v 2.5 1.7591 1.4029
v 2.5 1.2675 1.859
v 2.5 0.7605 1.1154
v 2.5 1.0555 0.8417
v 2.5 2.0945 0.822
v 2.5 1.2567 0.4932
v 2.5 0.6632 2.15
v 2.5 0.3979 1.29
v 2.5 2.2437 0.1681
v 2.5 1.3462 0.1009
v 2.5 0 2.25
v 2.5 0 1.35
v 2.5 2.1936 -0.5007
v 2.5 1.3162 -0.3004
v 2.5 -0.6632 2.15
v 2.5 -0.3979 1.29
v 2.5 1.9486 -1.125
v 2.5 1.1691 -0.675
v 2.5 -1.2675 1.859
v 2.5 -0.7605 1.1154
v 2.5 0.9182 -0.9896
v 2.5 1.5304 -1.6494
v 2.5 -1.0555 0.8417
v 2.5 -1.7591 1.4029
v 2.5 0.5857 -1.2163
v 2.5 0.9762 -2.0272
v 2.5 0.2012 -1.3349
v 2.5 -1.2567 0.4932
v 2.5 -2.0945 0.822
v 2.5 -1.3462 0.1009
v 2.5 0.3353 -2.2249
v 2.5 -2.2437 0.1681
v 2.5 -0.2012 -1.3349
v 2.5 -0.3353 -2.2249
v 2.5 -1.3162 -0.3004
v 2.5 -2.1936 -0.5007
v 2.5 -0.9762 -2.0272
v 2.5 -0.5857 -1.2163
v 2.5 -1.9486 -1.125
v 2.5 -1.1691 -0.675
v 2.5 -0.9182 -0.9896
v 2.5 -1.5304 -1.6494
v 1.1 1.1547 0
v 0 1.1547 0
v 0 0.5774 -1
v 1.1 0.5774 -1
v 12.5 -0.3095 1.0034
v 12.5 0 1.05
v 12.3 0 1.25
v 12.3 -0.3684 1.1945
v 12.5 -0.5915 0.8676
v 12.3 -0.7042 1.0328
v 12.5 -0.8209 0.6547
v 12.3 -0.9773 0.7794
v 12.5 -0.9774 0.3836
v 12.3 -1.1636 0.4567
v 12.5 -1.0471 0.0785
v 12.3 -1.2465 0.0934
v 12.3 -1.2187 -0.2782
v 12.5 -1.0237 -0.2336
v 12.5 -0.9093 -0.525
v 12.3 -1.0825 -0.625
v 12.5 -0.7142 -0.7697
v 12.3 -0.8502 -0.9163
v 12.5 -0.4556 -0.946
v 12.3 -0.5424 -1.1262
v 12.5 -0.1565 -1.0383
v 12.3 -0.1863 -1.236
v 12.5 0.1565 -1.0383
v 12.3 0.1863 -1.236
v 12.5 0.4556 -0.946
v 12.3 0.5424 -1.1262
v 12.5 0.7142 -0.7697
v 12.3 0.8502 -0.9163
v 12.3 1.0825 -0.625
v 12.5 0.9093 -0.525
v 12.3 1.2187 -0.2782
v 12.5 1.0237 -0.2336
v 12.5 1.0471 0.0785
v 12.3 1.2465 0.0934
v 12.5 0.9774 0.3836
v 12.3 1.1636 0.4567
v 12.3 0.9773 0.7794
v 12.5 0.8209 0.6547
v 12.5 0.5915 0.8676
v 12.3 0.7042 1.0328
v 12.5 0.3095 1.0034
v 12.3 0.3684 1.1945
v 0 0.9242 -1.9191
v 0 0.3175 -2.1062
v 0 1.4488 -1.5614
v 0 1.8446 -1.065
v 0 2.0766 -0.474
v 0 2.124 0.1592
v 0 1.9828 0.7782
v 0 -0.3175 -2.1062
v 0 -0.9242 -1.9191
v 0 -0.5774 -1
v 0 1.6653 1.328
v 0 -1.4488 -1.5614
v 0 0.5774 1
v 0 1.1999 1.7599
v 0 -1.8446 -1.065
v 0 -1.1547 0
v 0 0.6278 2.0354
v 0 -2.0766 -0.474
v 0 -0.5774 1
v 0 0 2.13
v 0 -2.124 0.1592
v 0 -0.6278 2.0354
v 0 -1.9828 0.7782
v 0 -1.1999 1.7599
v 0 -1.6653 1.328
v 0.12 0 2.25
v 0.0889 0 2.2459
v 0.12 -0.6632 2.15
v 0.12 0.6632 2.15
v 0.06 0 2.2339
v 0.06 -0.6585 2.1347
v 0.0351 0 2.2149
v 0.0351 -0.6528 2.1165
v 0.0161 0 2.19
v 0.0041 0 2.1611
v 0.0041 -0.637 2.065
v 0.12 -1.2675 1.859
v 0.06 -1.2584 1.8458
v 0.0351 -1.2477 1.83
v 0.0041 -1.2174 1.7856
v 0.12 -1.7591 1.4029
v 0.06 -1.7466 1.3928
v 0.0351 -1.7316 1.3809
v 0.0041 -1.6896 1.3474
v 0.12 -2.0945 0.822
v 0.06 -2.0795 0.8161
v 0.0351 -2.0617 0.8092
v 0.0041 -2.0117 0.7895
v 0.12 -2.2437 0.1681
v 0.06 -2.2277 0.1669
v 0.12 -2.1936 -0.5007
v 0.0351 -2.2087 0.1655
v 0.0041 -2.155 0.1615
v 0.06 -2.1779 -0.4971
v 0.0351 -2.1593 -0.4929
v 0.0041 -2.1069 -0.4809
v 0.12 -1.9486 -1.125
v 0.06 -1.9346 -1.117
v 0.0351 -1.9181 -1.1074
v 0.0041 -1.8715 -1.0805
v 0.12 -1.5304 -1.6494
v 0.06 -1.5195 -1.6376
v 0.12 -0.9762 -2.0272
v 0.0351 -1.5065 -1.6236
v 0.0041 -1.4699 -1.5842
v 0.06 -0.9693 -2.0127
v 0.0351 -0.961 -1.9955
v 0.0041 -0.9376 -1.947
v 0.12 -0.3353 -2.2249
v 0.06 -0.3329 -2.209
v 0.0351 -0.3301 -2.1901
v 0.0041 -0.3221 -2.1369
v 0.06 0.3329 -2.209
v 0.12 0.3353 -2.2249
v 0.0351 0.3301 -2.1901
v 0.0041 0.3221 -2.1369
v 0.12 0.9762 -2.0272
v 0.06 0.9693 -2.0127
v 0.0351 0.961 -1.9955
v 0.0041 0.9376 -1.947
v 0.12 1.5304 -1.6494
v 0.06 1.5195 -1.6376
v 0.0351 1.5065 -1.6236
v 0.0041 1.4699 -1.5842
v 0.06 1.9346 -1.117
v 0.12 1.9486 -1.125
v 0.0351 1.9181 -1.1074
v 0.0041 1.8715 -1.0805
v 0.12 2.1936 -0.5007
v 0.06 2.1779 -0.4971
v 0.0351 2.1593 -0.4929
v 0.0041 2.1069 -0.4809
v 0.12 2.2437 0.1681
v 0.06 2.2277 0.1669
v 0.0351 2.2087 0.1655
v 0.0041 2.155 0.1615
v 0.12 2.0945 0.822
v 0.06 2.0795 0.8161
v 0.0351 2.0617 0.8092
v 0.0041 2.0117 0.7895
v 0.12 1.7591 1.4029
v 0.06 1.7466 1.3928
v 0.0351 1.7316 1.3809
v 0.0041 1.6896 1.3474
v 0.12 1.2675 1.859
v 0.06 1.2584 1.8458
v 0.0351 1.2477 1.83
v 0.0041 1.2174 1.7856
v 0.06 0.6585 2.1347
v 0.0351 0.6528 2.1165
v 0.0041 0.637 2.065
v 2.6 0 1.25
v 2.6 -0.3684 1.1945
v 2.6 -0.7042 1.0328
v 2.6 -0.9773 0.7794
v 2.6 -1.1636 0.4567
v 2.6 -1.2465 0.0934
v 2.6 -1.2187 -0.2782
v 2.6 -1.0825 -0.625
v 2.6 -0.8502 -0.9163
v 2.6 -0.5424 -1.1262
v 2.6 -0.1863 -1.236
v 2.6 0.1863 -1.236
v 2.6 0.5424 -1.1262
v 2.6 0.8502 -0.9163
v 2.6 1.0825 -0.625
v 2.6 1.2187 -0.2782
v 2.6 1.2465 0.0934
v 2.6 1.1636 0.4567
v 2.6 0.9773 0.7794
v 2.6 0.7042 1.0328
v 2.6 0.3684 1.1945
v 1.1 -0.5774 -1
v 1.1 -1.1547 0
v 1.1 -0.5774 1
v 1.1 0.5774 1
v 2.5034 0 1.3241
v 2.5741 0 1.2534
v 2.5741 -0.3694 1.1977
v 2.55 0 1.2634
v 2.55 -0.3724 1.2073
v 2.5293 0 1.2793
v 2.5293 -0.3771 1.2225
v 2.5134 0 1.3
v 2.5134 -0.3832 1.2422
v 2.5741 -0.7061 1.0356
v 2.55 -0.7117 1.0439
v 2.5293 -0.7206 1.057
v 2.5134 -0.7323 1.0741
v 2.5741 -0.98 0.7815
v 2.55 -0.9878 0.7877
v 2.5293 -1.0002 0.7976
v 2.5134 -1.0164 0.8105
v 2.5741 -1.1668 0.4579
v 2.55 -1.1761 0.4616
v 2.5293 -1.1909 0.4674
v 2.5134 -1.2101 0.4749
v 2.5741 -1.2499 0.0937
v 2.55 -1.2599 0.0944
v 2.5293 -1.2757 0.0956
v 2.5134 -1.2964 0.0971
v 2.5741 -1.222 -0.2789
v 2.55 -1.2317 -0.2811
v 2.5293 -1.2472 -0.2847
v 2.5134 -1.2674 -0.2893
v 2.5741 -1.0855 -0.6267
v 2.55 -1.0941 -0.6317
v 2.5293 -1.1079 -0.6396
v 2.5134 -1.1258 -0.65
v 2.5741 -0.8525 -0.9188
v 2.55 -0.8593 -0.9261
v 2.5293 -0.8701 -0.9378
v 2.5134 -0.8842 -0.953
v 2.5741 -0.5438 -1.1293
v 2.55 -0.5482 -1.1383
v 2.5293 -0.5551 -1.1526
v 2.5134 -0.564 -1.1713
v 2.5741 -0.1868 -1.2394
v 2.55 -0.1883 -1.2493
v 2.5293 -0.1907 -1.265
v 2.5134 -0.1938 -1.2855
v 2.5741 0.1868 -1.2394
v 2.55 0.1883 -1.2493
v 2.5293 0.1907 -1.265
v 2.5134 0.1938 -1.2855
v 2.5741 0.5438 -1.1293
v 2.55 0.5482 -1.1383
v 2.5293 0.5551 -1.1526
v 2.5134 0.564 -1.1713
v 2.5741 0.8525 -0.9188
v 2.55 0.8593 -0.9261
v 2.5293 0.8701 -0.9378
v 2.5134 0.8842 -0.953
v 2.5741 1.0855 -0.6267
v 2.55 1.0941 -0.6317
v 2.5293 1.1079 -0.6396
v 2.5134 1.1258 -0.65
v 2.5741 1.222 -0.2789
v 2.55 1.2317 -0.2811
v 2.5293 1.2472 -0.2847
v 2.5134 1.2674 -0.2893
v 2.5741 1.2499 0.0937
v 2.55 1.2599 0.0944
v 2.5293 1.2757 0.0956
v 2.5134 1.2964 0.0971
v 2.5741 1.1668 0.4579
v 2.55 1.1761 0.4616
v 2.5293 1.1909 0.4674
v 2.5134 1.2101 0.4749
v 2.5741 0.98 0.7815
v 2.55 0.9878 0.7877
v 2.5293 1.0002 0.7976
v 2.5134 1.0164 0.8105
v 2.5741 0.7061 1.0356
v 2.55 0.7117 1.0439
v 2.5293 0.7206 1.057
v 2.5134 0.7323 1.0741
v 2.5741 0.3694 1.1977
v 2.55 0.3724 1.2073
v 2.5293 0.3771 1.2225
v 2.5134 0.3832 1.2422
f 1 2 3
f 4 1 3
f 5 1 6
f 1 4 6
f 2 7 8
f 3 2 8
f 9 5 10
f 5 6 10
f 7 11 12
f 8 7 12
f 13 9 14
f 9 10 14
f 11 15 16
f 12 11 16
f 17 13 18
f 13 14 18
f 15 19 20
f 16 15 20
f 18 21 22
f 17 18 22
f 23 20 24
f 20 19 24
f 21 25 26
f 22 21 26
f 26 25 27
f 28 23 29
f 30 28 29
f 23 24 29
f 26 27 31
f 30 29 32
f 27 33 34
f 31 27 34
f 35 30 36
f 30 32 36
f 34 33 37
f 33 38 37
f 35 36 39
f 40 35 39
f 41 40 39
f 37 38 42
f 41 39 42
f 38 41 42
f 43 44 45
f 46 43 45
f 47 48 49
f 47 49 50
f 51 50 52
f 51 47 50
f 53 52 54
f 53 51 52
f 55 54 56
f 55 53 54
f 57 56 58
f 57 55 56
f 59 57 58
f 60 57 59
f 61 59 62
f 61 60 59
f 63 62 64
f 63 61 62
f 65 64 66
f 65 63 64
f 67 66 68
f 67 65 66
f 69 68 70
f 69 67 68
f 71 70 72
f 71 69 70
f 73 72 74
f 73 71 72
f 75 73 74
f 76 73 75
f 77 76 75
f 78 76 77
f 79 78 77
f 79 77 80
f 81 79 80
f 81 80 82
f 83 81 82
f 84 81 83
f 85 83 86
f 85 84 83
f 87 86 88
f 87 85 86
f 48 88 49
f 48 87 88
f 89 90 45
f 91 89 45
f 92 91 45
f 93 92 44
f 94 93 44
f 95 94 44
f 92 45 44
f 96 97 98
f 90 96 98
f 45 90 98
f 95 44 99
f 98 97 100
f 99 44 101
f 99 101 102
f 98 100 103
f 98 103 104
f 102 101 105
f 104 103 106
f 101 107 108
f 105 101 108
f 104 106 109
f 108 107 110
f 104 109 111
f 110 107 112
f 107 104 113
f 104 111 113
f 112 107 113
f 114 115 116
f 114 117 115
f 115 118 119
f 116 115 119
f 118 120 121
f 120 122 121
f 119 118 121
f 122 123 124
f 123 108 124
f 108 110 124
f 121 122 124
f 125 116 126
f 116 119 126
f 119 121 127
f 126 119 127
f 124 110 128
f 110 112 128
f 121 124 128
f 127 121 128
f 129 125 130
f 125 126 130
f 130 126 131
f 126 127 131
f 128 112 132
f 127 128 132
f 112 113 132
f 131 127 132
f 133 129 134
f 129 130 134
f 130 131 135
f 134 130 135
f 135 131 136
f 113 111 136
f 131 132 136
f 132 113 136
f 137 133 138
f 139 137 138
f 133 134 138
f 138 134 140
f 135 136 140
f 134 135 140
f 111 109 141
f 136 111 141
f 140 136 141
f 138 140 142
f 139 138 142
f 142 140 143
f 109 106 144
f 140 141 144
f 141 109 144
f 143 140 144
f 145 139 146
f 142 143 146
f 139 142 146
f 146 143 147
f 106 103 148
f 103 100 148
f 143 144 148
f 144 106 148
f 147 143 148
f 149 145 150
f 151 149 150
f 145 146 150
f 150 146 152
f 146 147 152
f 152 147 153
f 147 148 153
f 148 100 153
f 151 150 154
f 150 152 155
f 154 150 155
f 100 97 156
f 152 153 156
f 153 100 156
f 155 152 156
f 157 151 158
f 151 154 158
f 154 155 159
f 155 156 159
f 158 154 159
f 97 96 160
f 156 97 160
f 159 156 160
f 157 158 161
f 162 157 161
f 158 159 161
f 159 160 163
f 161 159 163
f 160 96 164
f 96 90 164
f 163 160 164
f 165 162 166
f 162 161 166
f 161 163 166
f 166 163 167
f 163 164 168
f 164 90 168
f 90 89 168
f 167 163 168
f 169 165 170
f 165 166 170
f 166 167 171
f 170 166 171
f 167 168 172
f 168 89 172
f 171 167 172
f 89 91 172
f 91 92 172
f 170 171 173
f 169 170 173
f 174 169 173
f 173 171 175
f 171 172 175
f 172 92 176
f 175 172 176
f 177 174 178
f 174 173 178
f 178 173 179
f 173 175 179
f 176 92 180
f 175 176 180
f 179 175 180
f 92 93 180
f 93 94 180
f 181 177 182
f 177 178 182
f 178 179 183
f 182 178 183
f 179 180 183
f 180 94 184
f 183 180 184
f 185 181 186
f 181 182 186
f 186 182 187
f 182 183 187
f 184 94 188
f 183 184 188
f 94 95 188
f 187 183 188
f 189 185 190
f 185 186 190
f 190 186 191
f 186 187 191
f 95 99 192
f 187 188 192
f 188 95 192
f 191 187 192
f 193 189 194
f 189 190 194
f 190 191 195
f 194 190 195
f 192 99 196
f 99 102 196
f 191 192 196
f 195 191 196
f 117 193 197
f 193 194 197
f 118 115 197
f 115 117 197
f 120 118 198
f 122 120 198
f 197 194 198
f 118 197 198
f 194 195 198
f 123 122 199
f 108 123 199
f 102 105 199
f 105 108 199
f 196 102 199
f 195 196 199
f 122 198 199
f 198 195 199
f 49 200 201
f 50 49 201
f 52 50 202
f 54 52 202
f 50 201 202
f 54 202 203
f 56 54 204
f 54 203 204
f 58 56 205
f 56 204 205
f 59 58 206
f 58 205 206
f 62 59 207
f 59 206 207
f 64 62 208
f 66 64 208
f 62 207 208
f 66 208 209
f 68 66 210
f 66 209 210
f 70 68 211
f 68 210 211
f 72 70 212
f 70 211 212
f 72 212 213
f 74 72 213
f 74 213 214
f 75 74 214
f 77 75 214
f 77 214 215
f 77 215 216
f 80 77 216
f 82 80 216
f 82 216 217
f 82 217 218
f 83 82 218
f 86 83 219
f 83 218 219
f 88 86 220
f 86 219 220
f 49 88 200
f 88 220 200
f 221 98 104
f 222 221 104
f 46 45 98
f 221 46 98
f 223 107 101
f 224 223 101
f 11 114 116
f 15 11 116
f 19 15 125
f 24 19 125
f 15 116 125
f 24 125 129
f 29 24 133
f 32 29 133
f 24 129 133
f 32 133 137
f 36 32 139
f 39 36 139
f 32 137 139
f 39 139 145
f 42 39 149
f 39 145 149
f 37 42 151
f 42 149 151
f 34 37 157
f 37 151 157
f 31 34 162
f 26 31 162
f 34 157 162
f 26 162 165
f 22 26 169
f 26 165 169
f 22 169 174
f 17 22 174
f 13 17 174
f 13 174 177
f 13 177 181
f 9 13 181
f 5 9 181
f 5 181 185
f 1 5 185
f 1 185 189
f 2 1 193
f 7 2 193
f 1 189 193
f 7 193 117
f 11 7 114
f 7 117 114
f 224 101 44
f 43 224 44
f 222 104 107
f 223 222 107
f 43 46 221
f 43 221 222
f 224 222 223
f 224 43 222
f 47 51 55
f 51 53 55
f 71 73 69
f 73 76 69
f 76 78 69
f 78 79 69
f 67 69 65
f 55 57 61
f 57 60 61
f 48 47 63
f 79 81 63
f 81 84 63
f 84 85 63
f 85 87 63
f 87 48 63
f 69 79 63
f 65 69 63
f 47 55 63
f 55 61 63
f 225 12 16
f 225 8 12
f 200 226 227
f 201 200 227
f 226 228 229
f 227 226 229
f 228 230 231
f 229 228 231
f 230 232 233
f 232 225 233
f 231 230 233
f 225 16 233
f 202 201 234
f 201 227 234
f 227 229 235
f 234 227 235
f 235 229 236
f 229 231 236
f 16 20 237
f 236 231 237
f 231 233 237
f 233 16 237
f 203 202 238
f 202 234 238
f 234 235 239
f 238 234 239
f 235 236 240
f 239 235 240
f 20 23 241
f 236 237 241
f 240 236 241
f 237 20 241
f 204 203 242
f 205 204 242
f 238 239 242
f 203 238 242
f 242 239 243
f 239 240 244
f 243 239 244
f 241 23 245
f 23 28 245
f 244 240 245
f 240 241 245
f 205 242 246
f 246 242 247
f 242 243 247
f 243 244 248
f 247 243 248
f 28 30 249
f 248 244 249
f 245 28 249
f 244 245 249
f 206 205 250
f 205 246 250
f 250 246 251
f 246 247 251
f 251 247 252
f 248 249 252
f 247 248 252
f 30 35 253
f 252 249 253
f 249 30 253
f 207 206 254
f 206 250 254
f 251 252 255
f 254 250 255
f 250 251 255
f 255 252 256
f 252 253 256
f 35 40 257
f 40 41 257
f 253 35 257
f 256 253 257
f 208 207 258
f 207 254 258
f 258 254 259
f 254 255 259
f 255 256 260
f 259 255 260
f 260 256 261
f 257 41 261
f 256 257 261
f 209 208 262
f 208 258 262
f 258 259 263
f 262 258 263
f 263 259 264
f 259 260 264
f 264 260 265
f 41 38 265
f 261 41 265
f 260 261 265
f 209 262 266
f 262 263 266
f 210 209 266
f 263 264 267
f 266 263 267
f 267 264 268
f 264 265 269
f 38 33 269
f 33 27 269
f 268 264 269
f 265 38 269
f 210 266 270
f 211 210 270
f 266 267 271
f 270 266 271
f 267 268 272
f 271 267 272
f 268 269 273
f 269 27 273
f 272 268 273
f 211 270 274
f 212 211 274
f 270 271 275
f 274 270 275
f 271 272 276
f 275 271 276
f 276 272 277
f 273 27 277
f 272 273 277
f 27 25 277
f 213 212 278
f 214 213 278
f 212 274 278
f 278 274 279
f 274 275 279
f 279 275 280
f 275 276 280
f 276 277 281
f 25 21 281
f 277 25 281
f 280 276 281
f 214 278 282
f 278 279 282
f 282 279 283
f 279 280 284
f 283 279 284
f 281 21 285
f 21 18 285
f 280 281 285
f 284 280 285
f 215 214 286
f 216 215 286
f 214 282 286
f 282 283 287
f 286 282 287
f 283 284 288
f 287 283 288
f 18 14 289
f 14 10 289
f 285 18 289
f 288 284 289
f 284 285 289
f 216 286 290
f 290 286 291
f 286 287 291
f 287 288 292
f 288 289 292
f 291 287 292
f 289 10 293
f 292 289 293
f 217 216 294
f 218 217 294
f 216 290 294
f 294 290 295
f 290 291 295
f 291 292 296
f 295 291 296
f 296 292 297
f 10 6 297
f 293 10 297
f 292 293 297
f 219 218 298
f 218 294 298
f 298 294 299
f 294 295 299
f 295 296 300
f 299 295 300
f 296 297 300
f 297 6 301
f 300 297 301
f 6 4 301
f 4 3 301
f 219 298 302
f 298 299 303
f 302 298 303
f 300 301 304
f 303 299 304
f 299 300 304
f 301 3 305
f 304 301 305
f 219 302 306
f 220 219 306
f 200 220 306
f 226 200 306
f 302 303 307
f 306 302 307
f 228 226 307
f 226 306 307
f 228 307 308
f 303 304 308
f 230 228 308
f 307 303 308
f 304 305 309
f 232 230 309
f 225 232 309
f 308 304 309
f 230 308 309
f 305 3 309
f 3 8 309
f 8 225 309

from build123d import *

# Parameters (mm, degrees)
FILLET1_R      = 0.1
FILLET2_R      = 0.12
CHAMFER1_SIZE  = 0.2
EXTRUDE1_DEPTH = 1.1


with BuildPart() as part:
    # Sketch1 → Revolve1 (revolve)
    with BuildSketch(Plane.XY, mode=Mode.PRIVATE) as revolve1_sk:
        Polygon((2.5, 1.25), (2.5, 0), (4.279914881, 0), (12.5, 0), (12.5, 1.25), align=None)
        Polygon((0, 2.25), (0, 0), (2.5, 0), (2.5, 1.25), (2.5, 2.25), align=None)
    revolve(revolve1_sk.sketch.rotate(Axis((0, 0, 0), (1, 0, 0)), 90), axis=Axis((0, 0, 0), (1, 0, 0)))

    # Fillet1
    fillet1_edges = [part.edges().sort_by_distance(p)[0] for p in [
        (2.5, 0, -1.25),
    ]]
    fillet(fillet1_edges, radius=FILLET1_R)

    # Fillet2
    fillet2_edges = [part.edges().sort_by_distance(p)[0] for p in [
        (0, 0, -2.25),
    ]]
    fillet(fillet2_edges, radius=FILLET2_R)

    # Chamfer1
    chamfer1_edges = [part.edges().sort_by_distance(p)[0] for p in [
        (12.5, 0, -1.25),
    ]]
    chamfer(chamfer1_edges, length=CHAMFER1_SIZE)

    # Sketch2 → Extrude1 (cut)
    with BuildSketch(Plane.ZY):
        Polygon((0, 1.154700538), (-1, 0.577350269), (-1, -0.577350269), (0, -1.154700538), (1, -0.577350269), (1, 0.577350269), align=None)
    extrude(amount=-EXTRUDE1_DEPTH, mode=Mode.SUBTRACT)


solid = part.part
